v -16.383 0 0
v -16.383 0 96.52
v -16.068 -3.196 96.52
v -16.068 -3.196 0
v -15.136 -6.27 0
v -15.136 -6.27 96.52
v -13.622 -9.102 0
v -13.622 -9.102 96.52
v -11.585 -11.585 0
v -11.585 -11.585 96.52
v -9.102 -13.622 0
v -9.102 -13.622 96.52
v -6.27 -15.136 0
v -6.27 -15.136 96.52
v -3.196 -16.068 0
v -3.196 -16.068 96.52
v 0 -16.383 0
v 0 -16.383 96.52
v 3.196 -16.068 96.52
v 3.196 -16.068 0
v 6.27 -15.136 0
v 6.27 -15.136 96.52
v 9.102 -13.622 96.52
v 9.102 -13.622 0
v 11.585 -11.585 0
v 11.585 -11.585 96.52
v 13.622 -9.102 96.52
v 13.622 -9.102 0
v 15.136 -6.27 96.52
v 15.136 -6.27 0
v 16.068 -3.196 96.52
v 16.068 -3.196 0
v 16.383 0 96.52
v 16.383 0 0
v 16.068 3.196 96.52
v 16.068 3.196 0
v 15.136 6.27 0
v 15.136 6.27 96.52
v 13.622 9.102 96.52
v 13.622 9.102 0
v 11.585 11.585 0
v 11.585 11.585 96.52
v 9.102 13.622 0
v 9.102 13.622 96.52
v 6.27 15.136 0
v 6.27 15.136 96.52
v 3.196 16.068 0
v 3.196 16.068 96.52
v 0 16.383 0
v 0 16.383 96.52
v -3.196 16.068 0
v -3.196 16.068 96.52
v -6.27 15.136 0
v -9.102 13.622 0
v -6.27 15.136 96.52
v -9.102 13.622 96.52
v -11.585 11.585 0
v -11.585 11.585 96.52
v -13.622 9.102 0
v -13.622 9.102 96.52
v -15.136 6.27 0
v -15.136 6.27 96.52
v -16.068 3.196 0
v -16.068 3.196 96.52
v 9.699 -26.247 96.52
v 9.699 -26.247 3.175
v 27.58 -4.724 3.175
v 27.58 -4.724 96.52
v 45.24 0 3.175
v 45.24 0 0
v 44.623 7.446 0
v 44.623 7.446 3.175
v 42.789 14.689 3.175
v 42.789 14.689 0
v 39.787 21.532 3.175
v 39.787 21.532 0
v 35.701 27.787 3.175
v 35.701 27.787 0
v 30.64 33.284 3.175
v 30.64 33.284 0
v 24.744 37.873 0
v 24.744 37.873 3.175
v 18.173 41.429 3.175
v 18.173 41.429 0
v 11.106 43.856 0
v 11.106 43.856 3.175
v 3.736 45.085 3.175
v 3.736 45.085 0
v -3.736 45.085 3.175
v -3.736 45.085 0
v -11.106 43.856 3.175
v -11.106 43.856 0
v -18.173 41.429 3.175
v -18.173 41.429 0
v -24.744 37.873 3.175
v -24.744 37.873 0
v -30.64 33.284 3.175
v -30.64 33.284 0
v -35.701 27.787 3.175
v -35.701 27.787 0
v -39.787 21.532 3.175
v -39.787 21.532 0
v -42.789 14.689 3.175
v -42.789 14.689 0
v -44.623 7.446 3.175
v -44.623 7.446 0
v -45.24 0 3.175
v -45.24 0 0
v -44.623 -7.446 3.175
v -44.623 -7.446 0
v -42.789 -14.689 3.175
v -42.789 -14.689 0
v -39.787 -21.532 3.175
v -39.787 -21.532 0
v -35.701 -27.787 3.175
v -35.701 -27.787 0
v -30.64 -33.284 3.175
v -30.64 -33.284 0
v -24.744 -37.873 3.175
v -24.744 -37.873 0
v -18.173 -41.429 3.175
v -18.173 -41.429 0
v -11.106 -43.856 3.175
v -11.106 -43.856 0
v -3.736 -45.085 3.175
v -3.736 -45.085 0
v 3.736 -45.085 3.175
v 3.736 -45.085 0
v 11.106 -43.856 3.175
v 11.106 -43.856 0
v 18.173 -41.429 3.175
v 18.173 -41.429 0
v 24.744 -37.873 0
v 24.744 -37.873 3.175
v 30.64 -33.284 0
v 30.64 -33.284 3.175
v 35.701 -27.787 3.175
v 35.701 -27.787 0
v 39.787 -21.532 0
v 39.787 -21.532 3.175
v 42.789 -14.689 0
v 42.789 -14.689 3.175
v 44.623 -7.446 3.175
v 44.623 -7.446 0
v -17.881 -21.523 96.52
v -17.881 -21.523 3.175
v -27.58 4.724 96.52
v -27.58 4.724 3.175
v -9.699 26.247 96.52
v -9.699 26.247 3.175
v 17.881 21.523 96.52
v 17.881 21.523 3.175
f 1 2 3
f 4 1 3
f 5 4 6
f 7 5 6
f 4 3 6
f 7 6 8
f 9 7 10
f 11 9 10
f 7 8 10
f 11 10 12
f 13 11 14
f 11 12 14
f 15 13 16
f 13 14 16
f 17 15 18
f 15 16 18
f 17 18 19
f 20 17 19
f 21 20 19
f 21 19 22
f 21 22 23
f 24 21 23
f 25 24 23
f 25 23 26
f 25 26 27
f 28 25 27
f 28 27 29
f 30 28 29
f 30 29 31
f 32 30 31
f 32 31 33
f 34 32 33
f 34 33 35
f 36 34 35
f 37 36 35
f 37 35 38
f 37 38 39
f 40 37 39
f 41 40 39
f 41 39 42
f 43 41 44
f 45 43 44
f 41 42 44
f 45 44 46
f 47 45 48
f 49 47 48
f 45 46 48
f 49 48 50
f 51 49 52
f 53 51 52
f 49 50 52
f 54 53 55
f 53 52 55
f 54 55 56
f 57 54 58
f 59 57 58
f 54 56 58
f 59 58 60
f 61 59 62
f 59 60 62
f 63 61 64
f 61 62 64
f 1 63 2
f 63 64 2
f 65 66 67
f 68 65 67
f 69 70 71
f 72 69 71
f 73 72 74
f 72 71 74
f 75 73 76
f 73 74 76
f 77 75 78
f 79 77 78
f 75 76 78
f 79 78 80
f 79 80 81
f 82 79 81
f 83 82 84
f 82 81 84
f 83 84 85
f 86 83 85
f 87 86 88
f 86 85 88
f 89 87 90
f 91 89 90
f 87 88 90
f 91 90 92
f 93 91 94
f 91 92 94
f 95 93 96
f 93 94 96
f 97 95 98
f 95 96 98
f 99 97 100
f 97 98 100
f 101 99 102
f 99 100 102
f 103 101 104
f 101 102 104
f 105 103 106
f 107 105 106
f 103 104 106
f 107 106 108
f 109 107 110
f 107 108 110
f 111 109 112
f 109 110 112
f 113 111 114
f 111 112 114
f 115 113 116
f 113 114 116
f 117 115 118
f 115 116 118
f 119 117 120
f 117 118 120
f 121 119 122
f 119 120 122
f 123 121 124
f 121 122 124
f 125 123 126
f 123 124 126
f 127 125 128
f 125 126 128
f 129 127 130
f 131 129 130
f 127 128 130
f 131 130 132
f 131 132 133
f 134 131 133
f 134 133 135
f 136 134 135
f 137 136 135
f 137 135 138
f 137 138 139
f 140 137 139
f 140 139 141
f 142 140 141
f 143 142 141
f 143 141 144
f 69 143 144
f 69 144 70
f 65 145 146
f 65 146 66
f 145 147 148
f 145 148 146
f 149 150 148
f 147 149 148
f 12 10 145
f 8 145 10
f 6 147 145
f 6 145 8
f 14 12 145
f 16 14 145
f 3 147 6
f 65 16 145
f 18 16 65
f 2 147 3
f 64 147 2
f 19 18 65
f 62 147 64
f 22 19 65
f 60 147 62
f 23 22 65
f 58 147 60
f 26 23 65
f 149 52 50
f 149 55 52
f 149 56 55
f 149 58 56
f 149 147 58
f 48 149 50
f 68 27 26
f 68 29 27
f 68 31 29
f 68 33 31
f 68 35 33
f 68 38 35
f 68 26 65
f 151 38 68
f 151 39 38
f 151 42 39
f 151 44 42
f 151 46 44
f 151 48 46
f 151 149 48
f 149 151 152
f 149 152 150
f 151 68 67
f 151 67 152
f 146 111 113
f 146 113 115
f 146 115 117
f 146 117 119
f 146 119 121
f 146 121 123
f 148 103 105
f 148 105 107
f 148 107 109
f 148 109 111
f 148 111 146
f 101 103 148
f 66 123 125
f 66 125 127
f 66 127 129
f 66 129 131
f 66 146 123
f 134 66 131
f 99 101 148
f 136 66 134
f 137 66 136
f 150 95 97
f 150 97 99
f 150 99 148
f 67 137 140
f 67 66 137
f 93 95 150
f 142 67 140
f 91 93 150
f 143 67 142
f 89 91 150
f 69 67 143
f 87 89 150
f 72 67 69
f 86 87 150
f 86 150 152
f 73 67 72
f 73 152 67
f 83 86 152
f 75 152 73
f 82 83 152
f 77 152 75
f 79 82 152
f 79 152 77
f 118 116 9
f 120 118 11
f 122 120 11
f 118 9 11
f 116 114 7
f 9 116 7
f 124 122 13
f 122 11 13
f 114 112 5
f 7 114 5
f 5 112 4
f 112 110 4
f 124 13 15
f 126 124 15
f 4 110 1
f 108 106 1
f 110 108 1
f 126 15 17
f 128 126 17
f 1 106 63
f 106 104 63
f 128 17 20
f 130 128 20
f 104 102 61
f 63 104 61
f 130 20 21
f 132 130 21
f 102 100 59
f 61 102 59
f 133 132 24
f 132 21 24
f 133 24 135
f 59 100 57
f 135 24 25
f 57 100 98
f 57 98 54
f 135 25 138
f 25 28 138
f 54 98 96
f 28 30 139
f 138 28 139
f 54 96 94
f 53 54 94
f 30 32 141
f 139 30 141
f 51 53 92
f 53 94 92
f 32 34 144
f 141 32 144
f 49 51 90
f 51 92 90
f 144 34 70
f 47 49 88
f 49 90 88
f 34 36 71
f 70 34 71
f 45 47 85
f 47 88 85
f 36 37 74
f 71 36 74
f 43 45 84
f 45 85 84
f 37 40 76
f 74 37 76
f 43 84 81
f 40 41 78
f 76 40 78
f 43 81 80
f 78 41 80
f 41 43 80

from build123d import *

# Parameters (mm, degrees)
F1_DEPTH = 96.52
F0_R     = 45.239836
F2_DEPTH = 3.175
F4_D     = 32.766


with BuildPart() as f1:
    # F0 (on Top) → F1 (new body)
    with BuildSketch(Plane.XY):
        Polygon((27.57971, -4.723722), (17.880718, 21.522868), (-9.698991, 26.24659), (-27.57971, 4.723722), (-17.880718, -21.522868), (9.698991, -26.24659), align=None)
    extrude(amount=F1_DEPTH)

    # F0 (on Top) → F2 (join)
    with BuildSketch(Plane.XY):
        Circle(F0_R)
        Polygon((-9.698991, 26.24659), (17.880718, 21.522868), (27.57971, -4.723722), (9.698991, -26.24659), (-17.880718, -21.522868), (-27.57971, 4.723722), align=None, mode=Mode.SUBTRACT)
    extrude(amount=F2_DEPTH)

    # F4 (through all)
    with Locations(Plane(origin=(0, 0, 0), x_dir=(1, 0, 0), z_dir=(0, 0, -1))):
        with Locations((0, 0)):
            Hole(F4_D / 2)


solid = f1.part
